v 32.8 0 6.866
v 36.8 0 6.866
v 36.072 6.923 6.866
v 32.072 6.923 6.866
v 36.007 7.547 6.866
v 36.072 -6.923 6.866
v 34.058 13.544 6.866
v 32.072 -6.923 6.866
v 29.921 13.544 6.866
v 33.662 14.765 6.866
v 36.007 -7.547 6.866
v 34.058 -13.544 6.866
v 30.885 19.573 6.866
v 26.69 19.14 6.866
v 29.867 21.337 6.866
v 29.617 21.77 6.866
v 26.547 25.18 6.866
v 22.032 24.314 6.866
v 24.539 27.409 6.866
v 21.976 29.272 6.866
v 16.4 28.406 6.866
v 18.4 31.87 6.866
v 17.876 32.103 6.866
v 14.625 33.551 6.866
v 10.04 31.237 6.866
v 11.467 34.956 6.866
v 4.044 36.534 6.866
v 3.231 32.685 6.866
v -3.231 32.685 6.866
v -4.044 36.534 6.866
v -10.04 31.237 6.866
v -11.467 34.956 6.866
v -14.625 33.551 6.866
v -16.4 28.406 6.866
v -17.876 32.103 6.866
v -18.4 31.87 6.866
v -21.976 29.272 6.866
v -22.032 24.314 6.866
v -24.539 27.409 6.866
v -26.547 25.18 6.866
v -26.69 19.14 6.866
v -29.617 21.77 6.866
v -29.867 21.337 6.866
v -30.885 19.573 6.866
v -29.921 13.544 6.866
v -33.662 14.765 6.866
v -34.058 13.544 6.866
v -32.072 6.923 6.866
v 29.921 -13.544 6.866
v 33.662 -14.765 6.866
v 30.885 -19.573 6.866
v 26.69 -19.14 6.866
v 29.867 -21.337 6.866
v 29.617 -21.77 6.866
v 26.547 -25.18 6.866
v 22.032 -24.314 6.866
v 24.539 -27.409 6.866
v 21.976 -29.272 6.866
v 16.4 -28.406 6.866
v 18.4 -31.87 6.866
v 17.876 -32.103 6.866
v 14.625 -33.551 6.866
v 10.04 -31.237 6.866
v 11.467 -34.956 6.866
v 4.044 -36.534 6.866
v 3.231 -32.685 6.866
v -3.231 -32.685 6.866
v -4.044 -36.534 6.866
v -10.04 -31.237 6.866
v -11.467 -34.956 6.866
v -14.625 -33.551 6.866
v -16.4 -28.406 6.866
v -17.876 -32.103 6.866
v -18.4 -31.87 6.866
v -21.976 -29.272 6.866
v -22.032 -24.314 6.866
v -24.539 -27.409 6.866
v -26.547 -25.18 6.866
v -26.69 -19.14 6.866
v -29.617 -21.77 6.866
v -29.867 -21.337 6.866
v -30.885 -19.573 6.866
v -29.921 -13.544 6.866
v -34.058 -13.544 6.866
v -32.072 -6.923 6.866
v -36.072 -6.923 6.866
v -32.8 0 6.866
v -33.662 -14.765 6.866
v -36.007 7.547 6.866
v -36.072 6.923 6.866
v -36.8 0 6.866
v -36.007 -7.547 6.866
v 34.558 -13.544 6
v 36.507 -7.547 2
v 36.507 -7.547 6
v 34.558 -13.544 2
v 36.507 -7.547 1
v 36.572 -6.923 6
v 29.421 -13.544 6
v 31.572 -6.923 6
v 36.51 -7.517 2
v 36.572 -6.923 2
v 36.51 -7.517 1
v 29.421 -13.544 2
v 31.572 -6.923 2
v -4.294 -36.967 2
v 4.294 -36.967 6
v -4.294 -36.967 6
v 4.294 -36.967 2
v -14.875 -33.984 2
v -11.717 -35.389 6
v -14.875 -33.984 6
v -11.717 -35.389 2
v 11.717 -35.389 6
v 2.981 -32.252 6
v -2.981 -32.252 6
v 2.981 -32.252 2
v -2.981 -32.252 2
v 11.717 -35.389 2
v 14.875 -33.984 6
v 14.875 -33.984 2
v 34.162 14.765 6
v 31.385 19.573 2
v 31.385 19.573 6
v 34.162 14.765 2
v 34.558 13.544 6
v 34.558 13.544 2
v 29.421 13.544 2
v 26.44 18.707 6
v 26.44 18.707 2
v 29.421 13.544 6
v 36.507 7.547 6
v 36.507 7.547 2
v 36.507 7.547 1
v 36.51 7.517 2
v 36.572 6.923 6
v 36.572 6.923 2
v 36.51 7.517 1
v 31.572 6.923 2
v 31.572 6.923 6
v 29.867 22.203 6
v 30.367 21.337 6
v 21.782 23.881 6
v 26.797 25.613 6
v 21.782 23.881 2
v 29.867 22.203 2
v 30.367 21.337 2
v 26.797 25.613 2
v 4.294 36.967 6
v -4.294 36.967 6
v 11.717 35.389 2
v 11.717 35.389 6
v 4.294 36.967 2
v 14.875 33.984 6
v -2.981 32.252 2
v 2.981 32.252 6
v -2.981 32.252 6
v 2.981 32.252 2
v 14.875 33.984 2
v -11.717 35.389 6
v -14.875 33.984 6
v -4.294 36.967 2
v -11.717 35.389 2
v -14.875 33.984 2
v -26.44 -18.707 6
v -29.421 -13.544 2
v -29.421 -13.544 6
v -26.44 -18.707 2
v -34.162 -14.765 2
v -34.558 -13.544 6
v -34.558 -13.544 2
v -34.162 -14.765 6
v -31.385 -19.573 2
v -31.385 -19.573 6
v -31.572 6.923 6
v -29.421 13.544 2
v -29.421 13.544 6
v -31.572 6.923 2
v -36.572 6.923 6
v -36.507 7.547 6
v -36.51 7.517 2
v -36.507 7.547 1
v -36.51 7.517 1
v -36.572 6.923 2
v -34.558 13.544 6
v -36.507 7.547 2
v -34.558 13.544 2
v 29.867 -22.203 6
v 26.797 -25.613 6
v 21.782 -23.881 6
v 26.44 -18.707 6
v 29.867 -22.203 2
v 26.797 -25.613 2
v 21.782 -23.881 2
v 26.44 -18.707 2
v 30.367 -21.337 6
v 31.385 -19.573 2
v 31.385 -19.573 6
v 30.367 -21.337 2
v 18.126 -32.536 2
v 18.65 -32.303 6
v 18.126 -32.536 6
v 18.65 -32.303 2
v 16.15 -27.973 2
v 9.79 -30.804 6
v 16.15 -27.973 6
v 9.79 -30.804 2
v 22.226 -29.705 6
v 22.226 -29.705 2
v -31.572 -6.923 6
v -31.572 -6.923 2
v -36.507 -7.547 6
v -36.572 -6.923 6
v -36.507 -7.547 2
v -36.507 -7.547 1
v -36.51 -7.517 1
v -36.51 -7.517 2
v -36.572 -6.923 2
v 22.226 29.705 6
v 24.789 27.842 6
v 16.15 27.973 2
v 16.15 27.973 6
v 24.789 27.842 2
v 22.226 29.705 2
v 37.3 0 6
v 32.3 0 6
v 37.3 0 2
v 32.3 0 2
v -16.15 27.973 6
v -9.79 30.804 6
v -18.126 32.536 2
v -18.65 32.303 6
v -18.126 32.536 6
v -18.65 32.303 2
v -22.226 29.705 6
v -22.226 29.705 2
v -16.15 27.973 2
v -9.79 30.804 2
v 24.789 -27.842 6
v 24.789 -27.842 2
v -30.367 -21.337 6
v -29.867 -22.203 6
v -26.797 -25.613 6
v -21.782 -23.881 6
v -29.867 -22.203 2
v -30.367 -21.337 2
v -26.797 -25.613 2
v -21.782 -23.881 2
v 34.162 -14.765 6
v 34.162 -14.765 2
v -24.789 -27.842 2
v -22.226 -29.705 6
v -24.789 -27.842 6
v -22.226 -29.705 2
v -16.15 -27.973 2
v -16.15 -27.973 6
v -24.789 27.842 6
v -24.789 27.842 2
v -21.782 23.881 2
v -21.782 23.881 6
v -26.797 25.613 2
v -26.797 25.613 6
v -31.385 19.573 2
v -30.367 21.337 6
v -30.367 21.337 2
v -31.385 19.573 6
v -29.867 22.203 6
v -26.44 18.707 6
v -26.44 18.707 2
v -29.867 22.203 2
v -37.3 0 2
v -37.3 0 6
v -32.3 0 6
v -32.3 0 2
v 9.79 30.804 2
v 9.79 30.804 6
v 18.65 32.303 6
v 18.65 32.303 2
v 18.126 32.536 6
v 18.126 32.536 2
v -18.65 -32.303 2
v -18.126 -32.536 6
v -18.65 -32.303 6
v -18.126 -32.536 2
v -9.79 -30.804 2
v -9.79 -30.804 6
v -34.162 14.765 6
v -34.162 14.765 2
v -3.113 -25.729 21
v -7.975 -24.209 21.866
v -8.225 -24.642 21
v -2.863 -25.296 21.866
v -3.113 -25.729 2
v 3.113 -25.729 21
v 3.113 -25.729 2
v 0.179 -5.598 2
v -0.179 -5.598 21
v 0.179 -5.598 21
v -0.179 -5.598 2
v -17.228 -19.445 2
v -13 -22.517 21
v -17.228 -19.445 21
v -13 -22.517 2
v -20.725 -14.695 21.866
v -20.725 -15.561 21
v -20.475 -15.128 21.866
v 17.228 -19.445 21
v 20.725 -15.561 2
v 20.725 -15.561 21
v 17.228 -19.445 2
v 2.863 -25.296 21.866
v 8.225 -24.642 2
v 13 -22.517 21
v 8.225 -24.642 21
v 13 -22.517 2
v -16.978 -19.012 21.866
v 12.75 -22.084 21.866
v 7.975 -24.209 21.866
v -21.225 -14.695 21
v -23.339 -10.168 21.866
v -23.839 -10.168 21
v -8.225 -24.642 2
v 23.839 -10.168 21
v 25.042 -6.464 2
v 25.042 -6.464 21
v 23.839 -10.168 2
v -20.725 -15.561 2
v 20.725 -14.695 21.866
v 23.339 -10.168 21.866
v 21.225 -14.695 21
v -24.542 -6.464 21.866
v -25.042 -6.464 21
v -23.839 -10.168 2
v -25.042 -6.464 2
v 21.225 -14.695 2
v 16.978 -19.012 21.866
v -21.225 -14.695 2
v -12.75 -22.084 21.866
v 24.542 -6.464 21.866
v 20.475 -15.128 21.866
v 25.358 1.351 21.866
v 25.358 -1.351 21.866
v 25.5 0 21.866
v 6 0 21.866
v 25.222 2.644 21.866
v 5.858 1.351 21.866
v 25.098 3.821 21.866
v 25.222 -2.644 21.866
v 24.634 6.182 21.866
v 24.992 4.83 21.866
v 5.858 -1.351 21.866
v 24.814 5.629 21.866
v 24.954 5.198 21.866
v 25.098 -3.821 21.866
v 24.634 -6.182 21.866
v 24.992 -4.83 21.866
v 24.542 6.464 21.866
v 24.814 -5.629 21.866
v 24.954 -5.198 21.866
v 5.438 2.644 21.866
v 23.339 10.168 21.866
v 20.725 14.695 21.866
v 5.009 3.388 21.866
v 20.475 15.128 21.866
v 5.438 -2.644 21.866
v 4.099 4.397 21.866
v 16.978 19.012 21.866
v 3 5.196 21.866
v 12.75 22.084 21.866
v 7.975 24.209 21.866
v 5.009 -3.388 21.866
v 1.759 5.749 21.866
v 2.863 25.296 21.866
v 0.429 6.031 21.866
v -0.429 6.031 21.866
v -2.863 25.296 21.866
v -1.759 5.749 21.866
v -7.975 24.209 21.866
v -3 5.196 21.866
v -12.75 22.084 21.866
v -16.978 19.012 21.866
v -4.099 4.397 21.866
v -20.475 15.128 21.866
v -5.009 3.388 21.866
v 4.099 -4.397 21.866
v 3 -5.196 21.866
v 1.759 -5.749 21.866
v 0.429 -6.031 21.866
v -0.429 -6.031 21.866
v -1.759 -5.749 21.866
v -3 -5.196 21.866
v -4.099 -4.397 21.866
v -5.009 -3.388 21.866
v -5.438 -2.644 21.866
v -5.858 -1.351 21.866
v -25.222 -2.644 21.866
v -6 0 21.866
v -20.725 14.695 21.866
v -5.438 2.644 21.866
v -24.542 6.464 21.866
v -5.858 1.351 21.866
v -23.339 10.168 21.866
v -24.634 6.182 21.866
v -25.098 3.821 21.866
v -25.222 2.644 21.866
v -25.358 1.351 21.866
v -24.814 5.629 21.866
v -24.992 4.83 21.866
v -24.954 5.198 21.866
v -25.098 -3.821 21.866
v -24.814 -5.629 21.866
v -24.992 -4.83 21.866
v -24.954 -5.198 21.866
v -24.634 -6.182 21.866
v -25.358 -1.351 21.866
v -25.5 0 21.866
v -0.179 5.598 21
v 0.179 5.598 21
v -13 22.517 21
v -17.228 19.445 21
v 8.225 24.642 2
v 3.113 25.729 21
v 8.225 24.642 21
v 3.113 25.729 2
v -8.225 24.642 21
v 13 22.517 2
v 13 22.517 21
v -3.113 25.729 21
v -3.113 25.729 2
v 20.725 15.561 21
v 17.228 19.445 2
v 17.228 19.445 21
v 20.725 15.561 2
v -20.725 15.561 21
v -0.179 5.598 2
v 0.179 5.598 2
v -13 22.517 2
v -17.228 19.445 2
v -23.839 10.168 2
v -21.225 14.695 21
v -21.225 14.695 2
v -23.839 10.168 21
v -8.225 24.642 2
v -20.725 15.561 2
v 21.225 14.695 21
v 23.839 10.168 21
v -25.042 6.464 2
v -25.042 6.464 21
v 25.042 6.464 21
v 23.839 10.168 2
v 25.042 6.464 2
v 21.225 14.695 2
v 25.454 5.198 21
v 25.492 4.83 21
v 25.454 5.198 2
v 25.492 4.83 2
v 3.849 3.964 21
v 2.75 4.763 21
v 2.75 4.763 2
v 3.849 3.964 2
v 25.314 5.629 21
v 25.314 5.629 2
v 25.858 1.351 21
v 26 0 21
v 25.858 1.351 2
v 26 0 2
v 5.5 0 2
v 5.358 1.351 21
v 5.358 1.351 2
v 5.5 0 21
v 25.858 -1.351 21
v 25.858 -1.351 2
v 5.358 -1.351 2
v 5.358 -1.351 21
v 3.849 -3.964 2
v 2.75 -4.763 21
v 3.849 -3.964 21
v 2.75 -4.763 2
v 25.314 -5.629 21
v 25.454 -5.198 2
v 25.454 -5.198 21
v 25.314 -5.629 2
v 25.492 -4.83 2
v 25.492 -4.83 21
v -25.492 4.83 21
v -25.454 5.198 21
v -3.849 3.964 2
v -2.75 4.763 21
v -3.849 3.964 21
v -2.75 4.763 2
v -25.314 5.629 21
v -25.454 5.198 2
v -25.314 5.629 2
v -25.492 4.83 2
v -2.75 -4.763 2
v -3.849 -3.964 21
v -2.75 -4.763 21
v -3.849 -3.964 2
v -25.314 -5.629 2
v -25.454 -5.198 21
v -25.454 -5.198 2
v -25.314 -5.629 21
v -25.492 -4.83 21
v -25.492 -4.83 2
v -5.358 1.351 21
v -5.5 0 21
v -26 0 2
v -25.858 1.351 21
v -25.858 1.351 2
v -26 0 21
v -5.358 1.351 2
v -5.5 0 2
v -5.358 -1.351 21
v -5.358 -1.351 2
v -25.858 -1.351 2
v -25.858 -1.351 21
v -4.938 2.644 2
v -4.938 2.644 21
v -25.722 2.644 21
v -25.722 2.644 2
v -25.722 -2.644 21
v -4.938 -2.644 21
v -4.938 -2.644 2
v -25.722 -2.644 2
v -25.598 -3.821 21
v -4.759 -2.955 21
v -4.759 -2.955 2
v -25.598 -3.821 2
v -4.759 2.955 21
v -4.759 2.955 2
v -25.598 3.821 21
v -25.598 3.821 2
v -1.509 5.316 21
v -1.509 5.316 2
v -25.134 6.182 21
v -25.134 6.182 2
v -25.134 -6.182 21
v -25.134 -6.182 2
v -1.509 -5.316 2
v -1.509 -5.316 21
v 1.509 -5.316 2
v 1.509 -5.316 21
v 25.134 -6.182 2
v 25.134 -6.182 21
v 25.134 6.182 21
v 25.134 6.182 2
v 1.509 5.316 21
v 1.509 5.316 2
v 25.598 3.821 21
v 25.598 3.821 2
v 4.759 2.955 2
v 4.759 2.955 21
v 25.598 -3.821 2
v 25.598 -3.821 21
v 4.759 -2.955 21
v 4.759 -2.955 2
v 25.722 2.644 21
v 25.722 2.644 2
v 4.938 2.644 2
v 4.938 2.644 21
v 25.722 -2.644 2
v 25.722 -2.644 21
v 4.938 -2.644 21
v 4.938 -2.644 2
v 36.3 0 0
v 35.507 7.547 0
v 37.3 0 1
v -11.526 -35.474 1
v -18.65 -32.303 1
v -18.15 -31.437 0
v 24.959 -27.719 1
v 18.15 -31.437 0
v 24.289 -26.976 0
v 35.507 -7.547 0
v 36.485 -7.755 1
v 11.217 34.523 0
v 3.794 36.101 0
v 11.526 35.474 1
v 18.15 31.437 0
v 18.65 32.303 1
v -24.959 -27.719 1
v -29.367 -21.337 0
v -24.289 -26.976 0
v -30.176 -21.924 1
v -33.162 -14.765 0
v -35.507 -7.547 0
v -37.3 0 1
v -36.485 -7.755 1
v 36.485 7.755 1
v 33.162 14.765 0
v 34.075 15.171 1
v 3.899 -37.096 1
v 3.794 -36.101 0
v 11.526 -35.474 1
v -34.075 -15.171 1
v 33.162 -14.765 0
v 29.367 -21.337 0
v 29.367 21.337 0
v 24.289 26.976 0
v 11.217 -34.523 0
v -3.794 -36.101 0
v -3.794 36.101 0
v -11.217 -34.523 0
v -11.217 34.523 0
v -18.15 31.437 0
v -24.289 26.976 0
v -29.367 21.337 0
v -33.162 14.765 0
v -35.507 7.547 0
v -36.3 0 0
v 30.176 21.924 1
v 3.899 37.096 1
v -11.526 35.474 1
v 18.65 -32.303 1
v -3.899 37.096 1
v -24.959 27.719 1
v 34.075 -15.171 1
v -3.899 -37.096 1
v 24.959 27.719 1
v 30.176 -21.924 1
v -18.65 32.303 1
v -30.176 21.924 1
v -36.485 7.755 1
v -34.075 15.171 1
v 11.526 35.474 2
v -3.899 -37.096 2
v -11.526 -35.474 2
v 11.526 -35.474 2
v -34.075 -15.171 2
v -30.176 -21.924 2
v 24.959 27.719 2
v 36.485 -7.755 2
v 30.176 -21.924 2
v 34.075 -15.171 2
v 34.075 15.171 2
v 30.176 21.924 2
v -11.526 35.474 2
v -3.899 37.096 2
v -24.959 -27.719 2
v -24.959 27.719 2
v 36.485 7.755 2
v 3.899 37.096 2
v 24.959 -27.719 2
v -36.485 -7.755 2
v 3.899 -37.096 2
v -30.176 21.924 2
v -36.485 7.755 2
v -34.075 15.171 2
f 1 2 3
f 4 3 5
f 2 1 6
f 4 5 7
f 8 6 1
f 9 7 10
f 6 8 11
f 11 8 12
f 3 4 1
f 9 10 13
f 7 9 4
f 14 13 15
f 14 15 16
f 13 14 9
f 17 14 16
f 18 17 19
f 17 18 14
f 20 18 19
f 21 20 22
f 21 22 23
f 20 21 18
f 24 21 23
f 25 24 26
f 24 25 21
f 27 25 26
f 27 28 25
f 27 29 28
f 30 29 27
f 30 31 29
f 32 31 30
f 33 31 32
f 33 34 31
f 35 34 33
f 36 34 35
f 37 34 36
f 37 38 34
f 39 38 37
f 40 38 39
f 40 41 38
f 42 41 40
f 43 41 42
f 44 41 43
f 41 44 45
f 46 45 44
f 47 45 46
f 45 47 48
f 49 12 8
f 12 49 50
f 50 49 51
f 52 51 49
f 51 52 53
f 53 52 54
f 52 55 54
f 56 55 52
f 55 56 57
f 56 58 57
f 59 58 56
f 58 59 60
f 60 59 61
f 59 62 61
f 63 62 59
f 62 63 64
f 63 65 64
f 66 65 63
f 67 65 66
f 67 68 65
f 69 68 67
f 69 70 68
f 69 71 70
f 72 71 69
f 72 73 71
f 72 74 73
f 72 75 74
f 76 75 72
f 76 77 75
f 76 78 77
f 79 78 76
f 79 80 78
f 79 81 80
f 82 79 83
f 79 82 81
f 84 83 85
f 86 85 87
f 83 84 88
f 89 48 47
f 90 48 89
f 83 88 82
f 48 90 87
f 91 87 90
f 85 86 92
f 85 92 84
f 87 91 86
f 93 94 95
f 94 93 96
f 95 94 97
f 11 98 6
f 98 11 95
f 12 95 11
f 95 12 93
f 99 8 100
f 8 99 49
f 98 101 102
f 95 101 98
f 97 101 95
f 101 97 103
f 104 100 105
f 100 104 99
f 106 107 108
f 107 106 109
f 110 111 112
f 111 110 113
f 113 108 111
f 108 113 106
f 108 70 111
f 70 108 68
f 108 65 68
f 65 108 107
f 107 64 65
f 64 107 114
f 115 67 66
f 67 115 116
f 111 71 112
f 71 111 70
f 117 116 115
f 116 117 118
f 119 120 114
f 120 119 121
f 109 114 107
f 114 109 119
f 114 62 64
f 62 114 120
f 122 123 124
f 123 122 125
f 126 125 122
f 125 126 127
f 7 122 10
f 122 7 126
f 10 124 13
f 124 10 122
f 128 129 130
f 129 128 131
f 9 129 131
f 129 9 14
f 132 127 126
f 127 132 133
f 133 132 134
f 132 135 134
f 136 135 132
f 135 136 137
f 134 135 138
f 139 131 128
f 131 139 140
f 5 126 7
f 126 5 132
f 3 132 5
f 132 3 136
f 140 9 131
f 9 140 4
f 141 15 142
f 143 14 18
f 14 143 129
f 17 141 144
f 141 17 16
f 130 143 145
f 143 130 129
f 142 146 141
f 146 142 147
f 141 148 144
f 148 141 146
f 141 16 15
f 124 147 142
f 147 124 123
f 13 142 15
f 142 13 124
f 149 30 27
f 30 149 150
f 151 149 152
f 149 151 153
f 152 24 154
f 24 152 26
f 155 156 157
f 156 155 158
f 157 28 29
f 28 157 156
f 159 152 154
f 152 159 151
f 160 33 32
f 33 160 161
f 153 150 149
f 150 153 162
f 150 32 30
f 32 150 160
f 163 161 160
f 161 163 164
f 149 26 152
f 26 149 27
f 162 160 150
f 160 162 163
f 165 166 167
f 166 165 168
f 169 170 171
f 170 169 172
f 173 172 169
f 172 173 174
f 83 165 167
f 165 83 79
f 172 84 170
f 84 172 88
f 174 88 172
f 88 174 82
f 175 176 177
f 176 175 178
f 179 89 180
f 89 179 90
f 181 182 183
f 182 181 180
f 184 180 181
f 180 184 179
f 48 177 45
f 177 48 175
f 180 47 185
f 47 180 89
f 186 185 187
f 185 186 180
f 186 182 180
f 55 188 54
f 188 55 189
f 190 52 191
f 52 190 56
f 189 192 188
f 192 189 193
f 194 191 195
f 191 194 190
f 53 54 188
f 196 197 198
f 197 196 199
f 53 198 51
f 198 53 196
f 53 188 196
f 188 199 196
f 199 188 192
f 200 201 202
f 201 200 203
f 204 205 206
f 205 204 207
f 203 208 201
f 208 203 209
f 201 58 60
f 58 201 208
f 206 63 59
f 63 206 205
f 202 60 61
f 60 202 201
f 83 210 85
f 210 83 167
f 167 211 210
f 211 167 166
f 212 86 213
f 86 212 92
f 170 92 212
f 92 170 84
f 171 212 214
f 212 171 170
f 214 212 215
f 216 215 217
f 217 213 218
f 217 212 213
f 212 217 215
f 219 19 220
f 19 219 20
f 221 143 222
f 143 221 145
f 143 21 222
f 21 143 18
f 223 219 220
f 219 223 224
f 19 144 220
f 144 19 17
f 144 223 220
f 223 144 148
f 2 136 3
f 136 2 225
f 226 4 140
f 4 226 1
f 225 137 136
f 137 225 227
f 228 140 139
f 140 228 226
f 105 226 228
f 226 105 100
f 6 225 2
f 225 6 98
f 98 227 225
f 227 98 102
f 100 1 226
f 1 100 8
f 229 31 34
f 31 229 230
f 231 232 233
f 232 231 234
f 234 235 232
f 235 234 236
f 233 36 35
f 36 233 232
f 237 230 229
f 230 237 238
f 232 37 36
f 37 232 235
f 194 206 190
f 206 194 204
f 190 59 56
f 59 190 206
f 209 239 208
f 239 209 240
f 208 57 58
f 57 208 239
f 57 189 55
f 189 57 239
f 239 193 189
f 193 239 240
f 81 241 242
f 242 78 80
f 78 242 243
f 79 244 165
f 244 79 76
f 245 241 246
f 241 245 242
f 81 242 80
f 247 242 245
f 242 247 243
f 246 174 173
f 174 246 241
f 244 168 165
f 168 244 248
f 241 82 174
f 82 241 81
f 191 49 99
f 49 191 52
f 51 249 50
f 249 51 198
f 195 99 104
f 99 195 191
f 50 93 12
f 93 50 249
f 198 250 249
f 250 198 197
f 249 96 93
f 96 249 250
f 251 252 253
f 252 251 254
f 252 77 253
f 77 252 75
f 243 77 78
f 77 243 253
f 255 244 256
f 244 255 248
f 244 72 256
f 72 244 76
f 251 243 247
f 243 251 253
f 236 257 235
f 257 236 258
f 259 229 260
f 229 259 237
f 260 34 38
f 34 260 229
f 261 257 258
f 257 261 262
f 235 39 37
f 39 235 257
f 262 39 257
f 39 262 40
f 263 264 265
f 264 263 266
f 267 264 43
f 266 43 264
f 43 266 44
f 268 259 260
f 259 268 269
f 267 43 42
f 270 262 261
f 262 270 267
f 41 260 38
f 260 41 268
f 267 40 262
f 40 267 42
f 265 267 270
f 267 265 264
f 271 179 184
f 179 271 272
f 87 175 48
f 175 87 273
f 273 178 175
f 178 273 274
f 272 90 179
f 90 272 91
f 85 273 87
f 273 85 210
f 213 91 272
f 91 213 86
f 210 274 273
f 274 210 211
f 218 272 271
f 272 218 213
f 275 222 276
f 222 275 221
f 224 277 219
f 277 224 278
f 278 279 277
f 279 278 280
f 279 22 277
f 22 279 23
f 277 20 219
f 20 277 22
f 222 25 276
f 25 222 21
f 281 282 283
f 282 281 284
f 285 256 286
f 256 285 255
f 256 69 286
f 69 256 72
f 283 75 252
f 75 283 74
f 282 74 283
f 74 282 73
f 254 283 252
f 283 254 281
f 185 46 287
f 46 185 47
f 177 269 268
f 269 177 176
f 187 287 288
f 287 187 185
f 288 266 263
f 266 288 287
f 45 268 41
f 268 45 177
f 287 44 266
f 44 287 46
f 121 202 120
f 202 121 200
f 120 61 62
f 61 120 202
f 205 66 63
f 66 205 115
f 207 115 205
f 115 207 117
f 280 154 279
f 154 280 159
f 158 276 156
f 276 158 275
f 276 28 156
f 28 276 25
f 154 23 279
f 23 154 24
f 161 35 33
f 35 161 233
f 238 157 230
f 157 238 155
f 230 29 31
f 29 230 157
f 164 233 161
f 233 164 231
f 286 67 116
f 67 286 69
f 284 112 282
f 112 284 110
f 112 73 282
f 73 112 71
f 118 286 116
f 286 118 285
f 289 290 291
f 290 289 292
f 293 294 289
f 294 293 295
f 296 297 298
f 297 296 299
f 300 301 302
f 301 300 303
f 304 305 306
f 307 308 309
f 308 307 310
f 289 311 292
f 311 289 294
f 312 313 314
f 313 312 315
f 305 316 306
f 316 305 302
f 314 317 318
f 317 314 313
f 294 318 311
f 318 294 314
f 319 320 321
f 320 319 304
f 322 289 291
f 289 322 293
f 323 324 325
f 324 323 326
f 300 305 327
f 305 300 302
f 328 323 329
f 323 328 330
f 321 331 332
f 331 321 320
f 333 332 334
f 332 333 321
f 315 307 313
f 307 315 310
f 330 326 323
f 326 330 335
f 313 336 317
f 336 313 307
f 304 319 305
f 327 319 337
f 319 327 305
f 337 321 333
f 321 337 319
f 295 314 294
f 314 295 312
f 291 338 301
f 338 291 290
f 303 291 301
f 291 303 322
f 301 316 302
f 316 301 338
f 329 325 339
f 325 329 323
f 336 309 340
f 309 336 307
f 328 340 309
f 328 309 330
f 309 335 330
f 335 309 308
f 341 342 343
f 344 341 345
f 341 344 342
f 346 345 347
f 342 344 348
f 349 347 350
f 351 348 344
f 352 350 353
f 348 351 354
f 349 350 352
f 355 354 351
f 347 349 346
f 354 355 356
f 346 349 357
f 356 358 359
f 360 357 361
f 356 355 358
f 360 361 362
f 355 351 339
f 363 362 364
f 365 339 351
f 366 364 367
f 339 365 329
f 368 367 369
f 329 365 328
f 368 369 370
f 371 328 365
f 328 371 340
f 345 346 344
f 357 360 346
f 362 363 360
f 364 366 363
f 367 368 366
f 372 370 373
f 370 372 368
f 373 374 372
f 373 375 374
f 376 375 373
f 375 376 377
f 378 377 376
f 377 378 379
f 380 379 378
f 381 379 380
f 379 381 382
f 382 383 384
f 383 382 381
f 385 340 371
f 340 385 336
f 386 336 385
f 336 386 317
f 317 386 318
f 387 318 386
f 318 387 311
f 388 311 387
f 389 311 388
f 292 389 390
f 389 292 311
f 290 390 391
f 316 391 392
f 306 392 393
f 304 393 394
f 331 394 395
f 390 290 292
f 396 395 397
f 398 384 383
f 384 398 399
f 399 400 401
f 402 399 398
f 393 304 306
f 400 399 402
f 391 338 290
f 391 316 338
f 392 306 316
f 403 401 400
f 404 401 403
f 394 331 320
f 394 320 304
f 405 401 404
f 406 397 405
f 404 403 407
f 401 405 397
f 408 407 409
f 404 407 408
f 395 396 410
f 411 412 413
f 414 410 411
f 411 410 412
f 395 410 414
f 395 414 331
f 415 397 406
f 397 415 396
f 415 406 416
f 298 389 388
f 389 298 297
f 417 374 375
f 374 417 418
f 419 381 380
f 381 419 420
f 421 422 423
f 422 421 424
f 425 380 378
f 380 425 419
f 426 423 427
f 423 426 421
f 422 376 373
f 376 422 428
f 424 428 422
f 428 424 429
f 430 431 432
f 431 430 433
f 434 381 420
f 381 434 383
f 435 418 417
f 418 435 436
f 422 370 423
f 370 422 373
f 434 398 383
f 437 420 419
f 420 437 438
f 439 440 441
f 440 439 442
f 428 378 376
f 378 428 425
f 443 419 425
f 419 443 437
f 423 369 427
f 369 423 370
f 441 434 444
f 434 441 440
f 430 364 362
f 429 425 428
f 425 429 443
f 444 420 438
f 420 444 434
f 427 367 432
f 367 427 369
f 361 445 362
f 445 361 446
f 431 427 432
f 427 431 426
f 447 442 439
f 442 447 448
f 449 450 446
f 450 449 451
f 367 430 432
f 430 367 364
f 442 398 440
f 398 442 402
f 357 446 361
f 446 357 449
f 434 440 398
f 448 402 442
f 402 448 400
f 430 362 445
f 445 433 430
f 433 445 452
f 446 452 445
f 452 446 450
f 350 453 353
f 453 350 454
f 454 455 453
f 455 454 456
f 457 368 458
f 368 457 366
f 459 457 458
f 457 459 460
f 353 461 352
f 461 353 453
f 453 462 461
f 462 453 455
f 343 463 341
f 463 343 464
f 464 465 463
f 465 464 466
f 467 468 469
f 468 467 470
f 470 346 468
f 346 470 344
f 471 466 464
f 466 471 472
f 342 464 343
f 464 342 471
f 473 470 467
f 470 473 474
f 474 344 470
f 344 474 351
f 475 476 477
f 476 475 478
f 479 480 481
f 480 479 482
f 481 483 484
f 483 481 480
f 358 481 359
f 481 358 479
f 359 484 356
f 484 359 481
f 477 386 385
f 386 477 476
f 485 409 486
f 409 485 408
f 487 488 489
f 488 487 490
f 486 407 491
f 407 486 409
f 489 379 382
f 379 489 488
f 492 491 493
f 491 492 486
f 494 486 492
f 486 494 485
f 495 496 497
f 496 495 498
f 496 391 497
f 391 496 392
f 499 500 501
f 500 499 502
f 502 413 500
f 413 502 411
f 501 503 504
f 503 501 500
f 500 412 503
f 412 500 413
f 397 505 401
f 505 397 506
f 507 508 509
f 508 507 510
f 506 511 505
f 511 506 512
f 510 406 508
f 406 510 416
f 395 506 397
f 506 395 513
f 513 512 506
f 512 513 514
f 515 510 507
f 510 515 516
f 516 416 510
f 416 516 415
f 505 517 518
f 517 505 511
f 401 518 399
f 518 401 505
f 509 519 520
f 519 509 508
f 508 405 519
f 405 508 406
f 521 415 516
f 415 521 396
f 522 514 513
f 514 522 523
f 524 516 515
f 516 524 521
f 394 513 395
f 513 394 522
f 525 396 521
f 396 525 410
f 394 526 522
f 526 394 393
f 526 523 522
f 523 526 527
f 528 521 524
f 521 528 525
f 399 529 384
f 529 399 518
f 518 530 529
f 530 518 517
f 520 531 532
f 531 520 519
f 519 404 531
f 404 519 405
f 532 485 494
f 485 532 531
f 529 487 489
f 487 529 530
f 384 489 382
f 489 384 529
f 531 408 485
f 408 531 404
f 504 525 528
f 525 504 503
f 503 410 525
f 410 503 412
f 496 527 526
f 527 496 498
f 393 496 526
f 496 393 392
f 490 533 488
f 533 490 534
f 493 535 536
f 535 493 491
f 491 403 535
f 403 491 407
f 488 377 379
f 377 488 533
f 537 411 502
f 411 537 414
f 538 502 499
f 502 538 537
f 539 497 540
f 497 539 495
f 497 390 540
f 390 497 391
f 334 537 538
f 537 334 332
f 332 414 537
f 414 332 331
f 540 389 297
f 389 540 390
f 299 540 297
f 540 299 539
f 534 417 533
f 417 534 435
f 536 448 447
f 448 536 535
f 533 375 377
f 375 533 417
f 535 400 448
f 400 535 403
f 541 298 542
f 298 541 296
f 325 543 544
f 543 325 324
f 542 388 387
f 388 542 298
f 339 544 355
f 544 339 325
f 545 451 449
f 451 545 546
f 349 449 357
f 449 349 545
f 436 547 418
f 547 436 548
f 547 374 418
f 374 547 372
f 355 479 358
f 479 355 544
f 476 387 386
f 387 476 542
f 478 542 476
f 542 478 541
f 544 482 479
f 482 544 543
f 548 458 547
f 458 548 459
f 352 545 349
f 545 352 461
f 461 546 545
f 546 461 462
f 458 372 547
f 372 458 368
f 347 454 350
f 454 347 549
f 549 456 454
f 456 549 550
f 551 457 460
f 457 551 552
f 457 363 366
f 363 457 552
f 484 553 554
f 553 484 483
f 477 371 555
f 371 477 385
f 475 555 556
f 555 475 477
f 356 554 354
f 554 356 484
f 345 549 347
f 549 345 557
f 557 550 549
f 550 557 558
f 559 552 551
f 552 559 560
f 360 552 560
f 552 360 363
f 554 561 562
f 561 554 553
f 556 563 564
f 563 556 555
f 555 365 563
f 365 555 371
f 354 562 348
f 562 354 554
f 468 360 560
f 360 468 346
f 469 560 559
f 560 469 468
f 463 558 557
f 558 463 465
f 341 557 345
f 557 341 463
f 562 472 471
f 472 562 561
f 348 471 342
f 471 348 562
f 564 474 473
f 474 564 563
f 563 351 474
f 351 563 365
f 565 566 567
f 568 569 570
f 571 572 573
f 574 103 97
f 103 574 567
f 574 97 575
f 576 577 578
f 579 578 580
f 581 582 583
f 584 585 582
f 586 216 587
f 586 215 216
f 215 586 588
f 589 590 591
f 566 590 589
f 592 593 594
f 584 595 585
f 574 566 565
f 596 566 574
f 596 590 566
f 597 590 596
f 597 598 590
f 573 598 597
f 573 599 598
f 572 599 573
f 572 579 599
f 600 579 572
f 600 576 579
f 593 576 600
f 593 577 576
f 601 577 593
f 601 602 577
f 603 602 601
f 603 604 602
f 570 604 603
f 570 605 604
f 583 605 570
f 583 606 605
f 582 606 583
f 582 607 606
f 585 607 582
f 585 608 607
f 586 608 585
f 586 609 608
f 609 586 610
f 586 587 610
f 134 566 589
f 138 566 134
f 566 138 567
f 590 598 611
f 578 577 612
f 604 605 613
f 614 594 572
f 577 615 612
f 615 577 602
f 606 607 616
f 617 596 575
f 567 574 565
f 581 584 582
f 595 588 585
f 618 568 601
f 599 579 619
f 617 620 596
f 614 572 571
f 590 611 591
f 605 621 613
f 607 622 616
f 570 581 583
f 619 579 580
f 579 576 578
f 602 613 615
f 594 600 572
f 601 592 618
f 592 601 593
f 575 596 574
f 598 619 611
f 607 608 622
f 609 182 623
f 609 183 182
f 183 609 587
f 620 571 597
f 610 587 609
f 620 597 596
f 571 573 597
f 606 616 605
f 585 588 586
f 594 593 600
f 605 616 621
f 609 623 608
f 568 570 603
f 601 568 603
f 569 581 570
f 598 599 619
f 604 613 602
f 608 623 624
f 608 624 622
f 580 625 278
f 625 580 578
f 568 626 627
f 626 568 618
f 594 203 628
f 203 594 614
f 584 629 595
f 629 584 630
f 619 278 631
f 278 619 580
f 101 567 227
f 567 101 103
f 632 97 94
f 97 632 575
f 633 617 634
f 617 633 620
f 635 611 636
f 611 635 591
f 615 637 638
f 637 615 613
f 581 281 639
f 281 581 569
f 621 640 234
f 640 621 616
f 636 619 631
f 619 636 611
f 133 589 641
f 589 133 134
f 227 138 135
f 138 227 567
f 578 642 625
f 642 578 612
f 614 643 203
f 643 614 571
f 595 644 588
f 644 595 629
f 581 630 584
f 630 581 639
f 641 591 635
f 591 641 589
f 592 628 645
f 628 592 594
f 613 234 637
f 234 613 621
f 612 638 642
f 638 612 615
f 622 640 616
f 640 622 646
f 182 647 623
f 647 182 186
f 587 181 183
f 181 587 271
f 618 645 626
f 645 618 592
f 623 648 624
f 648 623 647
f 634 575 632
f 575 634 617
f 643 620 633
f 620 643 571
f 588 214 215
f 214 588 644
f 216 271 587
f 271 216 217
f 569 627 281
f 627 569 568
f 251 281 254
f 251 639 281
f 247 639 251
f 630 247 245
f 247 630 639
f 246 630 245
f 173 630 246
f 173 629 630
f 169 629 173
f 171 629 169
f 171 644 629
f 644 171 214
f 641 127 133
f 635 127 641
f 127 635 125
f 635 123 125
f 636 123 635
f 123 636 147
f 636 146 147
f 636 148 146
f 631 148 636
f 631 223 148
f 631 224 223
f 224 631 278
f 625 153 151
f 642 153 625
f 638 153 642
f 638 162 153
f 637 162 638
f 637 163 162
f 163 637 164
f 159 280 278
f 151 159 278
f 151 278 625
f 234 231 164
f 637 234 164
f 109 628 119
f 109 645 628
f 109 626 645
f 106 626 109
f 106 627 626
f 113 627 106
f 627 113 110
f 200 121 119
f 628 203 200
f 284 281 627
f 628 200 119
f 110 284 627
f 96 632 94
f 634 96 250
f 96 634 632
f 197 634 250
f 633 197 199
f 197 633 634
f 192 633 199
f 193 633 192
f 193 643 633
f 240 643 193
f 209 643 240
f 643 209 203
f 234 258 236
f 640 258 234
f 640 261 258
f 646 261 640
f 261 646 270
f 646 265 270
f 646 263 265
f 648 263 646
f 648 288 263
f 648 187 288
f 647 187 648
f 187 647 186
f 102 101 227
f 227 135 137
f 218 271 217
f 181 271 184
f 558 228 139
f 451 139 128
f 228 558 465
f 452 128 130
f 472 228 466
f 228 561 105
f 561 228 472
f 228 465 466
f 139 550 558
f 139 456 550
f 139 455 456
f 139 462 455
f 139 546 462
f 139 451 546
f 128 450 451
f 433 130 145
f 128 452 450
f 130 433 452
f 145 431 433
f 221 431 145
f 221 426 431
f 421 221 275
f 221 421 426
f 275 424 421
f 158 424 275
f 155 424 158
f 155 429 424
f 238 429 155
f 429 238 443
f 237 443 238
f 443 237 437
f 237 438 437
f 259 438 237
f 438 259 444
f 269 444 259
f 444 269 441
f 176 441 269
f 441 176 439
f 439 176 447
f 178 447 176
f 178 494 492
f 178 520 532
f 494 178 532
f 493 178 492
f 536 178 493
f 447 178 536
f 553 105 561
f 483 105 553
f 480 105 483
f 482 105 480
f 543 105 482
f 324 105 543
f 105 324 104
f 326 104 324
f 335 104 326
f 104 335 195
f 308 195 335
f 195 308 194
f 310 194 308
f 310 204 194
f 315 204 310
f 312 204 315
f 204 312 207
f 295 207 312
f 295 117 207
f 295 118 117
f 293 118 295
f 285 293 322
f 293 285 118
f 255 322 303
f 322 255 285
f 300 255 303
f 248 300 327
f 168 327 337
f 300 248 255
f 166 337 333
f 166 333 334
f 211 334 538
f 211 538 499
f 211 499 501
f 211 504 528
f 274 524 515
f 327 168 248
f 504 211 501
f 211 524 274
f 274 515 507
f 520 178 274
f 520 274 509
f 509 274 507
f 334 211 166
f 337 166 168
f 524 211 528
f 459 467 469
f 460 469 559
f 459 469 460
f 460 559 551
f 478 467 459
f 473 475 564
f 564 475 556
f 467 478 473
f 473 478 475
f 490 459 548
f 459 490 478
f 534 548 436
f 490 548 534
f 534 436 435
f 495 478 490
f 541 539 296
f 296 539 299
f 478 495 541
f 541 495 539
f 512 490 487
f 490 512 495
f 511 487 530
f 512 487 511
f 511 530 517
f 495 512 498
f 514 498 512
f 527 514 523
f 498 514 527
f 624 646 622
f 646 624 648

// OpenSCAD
funnelOuterR = 63.6 / 2;      //CHECK THESE BEFORE PRINTING!!!!
funnelInnerR = 53 / 2;    //CHECK THESE BEFORE PRINTING!!!!
coreR = 5.5;            //CHECK THESE BEFORE PRINTING!!!!


baseHeight = 2;   //Needs to be greater than 2 x minkR
wallThickness = 5;
wallHeight = 5;
standHeight = 20;

res = 30;   //240 for a clean build (5 hours rendering time)

minkR = 1;
clearance = 0.5;

// format is: [cylinder height, cylinder radius]
cylDims = [
    [5, funnelOuterR - minkR],
    [20, funnelInnerR - minkR - clearance]
    ];

module make(){
    difference(){
        translate([0,0,minkR]) cylinder(h = baseHeight + wallHeight - 2 * minkR, r = funnelOuterR + wallThickness + clearance - minkR, $fn = res);
        #translate([0,0,baseHeight - minkR]) cylinder(h = 200, r = funnelOuterR + clearance + minkR, $fn = res);
    }
    difference(){
        translate([0,0,minkR]) cylinder(h = baseHeight + standHeight - 2 * minkR, r = funnelInnerR - clearance - minkR, $fn = res);
        translate([0,0,0]) cylinder(h = 200, r = coreR + minkR, $fn = res);
    }

}

module addBase(){
    cylinder(h = minkR, r1 = funnelOuterR + wallThickness + clearance - minkR, r2 = funnelOuterR + wallThickness + clearance);
    translate([0,0,minkR]) cylinder(h = baseHeight - minkR, r = funnelOuterR + wallThickness + clearance);
}
     
module makeWithMink(){
    minkowski(){
        make();
        minkShape();
    }
}

module minkShape(){
    rotate([180,0,0]) difference(){
        sphere(r = minkR, $fn = res / 5);
        translate([0,0,100]) cube(size = 200,center = true);
    }
}

//minkShape();

makeWithMink();
addBase();
